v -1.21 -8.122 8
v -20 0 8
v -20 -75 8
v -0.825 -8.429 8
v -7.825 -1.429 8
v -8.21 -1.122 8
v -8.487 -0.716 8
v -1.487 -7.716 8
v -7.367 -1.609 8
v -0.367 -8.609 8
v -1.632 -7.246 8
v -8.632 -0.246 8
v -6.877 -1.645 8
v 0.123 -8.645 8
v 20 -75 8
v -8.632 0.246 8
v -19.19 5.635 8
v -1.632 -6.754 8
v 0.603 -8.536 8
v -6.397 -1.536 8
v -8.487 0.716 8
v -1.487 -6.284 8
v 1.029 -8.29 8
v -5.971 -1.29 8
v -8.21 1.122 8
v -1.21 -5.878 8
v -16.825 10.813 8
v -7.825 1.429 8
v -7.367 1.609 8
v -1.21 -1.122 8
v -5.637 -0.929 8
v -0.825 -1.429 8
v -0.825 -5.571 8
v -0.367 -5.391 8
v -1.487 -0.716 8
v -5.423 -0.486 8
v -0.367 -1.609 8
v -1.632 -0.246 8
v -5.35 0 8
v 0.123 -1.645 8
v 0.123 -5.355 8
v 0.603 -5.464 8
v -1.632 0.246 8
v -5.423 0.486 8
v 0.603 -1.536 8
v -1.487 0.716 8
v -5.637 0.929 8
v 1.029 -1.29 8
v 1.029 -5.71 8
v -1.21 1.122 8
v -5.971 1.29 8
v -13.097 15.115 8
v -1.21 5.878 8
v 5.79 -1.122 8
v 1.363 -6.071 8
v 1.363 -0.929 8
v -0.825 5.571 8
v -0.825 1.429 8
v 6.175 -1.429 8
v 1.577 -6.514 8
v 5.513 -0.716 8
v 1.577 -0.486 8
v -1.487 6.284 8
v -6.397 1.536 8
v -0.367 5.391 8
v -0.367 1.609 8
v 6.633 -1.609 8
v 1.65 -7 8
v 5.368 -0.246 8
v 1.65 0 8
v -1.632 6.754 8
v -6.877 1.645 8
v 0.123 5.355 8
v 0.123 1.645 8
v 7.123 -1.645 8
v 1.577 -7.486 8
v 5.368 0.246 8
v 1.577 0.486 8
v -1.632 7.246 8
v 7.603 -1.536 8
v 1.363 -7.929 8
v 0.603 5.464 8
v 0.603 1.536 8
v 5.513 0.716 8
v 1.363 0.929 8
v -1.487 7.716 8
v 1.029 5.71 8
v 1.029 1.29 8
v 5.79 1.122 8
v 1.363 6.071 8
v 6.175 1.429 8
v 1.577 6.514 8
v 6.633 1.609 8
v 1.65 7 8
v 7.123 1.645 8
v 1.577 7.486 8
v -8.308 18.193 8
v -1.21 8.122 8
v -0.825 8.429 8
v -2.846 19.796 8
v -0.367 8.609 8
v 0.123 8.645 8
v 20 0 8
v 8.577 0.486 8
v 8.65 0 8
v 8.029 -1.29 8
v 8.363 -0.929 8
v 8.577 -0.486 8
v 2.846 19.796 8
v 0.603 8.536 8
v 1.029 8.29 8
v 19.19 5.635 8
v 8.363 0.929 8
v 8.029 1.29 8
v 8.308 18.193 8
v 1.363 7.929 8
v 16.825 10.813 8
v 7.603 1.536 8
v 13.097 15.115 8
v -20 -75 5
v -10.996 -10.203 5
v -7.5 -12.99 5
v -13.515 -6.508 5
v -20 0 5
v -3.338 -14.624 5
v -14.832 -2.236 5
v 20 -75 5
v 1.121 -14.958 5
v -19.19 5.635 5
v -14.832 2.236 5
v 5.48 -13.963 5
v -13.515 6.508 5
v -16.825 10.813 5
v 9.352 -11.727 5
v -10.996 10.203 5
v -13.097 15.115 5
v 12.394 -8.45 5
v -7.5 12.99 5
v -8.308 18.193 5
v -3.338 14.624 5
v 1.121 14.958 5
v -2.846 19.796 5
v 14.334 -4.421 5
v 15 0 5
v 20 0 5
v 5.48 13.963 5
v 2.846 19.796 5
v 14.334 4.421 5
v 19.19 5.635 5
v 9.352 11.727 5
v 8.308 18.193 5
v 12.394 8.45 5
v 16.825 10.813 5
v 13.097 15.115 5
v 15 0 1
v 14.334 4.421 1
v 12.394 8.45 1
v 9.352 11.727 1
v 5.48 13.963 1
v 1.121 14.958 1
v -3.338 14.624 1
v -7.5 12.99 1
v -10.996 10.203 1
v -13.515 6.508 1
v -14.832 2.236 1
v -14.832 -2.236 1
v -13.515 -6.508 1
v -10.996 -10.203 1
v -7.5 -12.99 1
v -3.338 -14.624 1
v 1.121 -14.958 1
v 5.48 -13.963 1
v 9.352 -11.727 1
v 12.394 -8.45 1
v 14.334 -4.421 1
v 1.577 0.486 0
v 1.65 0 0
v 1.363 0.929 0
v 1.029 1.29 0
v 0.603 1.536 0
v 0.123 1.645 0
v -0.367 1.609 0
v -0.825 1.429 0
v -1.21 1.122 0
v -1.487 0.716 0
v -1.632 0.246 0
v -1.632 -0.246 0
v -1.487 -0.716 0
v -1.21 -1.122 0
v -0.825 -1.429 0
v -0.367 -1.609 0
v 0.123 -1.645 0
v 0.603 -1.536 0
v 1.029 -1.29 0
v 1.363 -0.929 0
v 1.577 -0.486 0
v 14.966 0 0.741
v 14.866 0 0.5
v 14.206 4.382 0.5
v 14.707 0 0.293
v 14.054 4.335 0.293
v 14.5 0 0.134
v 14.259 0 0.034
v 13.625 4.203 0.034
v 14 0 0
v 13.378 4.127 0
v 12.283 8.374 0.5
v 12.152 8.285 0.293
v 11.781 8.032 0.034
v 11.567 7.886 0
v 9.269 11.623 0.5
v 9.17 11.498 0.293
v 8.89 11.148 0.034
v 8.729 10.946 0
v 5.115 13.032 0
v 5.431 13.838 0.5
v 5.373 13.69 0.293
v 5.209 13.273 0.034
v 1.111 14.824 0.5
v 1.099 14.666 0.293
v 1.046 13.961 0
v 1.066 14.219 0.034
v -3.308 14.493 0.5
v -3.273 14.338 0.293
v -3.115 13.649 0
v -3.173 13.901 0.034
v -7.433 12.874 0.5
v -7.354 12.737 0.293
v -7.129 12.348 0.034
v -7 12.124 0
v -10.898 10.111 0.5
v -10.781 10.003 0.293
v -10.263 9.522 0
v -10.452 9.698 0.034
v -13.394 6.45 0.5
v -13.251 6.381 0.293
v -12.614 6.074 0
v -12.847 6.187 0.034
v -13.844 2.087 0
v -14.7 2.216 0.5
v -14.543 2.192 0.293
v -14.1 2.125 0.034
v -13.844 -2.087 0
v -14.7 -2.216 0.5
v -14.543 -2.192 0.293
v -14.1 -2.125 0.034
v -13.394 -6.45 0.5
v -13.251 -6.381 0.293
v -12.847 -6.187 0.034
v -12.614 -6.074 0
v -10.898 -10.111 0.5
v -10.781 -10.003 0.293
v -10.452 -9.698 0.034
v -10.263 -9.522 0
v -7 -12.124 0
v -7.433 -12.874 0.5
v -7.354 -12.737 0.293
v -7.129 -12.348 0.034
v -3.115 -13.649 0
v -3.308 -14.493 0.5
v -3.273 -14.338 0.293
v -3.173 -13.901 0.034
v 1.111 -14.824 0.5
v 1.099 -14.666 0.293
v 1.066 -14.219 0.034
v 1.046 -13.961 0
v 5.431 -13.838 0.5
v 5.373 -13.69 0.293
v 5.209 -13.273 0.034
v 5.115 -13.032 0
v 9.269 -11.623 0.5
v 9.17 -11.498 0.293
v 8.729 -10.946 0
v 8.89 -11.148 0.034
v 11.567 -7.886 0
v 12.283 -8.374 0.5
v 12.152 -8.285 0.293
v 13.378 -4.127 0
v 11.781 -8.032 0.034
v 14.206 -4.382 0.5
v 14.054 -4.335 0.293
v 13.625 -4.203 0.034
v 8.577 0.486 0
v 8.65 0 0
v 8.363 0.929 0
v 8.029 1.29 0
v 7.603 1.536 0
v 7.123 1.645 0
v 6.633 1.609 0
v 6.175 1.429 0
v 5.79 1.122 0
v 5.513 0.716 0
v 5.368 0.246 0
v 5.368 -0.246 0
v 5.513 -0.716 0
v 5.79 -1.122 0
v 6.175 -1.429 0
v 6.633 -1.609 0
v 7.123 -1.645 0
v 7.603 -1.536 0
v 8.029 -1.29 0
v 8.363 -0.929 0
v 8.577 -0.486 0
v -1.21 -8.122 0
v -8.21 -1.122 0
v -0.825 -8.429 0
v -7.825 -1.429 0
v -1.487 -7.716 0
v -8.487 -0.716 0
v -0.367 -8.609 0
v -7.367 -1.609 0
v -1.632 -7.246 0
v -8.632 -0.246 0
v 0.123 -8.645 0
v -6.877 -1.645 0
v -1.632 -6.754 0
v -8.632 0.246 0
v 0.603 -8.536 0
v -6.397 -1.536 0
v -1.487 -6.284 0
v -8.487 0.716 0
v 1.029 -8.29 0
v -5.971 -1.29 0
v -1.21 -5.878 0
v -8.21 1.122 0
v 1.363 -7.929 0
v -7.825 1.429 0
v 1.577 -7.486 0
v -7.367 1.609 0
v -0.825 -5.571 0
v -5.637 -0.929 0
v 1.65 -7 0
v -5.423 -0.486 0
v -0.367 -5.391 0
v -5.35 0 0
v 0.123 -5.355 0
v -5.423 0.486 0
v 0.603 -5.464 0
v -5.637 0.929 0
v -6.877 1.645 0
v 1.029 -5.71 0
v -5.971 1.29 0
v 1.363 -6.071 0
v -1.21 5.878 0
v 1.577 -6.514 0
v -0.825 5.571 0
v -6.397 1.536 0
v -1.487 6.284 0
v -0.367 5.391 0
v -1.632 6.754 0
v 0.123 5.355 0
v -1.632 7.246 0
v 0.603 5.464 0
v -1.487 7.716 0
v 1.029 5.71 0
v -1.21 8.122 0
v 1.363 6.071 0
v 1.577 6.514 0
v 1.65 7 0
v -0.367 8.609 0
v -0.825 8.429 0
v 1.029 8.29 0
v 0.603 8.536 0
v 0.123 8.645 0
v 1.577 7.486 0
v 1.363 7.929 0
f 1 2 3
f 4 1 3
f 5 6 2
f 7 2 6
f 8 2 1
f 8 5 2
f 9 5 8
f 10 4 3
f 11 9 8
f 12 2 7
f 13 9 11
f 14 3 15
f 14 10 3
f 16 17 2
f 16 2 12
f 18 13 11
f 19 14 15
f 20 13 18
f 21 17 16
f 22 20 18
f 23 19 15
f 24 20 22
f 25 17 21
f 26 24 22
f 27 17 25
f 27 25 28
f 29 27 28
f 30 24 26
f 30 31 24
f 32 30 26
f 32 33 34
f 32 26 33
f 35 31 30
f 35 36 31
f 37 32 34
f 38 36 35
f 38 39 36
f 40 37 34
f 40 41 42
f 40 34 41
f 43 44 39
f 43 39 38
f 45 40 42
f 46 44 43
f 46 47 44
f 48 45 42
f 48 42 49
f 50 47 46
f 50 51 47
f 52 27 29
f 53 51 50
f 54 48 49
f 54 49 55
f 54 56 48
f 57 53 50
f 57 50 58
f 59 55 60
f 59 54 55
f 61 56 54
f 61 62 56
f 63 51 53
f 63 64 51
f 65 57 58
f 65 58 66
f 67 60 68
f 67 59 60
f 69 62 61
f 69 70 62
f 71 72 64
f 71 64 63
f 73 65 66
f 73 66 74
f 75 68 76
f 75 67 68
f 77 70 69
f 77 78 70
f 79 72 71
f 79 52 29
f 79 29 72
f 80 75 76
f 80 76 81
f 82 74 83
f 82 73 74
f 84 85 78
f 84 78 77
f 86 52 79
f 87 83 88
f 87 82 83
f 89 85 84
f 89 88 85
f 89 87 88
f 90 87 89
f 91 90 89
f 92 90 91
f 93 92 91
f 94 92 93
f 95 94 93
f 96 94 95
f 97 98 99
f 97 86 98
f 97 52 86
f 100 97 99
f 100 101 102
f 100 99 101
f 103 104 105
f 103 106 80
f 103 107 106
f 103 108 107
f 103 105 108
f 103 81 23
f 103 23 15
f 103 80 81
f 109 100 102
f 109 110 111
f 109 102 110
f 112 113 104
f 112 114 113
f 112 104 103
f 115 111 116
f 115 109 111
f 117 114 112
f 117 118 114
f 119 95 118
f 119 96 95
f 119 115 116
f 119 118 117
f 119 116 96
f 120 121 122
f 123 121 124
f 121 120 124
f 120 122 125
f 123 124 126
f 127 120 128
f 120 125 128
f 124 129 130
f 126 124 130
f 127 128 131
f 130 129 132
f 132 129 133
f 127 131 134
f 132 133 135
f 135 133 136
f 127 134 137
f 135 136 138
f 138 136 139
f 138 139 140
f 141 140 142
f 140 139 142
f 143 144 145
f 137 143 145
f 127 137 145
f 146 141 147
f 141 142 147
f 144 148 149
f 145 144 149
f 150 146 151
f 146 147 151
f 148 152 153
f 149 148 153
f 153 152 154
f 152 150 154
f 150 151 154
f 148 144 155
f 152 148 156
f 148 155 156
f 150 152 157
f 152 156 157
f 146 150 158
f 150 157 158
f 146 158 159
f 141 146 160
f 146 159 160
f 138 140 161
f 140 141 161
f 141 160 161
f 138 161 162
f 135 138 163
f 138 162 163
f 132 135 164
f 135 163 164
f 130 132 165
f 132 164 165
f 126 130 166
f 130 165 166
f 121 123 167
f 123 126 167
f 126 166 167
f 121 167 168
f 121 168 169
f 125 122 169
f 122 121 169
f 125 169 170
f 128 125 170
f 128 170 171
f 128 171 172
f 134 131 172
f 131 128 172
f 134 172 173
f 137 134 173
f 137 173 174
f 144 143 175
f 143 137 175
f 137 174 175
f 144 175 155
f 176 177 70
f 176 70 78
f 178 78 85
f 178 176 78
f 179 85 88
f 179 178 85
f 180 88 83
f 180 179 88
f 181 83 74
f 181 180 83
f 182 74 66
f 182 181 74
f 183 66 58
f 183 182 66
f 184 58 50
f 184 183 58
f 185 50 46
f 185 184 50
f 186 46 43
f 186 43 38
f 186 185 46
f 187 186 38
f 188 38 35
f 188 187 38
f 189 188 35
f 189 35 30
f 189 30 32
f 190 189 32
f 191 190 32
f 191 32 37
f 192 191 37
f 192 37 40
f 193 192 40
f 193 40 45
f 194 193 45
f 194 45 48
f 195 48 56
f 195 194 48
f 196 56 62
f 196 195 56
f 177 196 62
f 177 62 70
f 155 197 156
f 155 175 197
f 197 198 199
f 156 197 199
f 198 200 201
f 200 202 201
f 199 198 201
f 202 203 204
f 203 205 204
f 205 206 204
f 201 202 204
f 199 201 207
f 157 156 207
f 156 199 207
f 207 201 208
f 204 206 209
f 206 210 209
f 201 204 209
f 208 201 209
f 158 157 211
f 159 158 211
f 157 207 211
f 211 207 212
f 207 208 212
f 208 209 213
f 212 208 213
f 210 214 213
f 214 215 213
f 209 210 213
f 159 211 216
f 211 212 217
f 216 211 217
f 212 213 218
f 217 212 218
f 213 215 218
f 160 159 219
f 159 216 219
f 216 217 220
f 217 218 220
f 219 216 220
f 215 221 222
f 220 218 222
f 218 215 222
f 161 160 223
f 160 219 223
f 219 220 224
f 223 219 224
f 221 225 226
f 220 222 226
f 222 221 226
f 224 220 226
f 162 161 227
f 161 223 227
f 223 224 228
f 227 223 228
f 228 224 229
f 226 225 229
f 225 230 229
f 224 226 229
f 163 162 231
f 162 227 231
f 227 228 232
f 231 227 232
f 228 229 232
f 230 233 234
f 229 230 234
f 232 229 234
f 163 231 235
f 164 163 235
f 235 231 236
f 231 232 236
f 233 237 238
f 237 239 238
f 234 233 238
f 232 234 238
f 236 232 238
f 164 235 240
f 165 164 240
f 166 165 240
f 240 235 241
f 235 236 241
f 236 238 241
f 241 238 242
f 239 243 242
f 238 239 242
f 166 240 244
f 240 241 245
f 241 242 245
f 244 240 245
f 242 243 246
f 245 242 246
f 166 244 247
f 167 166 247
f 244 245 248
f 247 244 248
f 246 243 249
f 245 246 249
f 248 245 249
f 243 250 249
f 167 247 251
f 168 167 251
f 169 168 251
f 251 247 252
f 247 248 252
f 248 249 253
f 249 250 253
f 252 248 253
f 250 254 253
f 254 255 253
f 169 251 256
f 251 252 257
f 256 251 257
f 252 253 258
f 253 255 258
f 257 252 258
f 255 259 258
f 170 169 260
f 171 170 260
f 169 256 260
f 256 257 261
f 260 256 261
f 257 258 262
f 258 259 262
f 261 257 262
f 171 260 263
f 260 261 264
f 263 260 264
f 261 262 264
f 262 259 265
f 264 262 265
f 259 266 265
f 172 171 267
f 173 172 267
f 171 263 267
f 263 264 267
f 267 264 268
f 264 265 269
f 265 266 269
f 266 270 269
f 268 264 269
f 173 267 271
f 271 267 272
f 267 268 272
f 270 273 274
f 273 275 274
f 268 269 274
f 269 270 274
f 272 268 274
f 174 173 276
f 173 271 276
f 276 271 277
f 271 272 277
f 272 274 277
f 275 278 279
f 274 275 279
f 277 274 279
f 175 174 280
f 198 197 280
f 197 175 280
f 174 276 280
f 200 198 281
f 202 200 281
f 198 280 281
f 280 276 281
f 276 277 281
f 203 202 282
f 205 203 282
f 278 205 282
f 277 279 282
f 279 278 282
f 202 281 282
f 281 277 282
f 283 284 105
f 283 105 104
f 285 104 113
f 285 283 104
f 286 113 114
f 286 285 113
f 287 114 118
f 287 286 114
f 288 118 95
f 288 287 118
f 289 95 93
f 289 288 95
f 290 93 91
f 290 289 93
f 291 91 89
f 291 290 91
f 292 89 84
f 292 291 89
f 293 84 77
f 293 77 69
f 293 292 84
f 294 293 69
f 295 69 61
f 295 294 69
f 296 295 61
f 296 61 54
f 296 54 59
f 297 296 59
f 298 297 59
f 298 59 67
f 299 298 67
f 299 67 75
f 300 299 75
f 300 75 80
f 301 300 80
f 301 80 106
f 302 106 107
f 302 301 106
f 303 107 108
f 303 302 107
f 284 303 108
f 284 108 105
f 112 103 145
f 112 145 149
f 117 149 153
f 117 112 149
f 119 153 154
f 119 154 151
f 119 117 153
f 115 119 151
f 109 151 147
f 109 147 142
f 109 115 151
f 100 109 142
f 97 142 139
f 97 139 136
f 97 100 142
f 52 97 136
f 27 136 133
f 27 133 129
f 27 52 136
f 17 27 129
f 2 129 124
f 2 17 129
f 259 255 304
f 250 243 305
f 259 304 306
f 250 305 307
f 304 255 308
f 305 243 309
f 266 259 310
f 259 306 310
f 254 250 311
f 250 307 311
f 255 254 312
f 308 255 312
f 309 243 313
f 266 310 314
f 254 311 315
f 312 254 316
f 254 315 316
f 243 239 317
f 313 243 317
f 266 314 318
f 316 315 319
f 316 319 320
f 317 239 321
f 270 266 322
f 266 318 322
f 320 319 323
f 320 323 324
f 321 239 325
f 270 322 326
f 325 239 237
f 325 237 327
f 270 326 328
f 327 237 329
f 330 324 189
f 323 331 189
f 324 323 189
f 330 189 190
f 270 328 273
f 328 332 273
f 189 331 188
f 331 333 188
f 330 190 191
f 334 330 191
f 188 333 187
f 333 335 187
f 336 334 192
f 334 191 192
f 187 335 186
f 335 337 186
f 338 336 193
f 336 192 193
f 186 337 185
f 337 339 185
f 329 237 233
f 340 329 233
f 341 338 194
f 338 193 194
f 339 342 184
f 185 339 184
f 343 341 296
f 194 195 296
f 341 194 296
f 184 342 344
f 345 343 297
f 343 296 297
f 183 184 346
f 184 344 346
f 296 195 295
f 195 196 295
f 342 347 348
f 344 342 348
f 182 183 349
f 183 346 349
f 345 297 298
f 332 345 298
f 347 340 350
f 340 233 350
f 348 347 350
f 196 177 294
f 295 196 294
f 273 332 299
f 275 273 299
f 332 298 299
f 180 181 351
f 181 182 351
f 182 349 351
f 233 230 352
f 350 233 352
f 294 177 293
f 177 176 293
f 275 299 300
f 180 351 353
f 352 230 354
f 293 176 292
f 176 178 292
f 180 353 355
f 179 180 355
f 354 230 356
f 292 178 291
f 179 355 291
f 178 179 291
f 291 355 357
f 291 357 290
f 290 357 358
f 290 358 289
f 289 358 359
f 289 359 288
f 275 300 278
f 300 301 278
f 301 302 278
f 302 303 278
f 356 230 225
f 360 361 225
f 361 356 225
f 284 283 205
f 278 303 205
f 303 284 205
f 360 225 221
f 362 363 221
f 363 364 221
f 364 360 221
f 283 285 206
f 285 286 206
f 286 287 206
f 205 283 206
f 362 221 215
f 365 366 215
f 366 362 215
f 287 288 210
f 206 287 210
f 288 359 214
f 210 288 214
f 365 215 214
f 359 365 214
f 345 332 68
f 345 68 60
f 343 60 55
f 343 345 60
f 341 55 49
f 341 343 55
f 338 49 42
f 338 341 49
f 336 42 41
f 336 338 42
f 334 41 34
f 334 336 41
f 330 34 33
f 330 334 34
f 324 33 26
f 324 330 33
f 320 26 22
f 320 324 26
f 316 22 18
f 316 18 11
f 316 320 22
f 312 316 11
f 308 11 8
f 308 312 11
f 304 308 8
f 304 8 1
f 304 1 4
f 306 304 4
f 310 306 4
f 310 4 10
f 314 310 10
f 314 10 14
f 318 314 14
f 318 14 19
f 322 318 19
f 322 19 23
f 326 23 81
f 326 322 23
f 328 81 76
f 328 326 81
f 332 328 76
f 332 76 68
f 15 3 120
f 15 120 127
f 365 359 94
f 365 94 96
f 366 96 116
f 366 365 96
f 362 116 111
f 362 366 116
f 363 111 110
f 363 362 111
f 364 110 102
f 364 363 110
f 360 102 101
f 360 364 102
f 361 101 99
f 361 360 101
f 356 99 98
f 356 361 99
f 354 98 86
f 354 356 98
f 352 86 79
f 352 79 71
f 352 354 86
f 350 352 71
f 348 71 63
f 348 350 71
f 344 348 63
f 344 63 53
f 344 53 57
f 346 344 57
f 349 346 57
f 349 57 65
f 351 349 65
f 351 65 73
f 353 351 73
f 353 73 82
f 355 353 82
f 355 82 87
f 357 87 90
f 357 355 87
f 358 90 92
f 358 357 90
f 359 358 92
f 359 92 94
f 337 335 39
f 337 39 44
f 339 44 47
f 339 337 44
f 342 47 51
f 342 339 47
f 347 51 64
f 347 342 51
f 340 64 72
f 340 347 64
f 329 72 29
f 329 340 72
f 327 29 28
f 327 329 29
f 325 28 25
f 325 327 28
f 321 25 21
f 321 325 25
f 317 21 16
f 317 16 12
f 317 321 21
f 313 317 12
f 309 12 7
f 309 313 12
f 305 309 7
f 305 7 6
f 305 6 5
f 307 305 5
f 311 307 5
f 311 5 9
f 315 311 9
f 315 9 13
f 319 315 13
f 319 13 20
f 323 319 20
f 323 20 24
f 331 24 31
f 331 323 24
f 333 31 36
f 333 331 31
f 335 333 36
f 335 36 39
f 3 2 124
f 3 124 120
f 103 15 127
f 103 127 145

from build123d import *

# Parameters (mm, degrees)
SKETCH_1_R      = 15
SKETCH_1_R_2    = 1.65
EXTRUDE_1_DEPTH = 8
FILLET_1_R      = 1
EXTRUDE_2_DEPTH = 3


with BuildPart() as part:
    # 草图1 → 凸台-拉伸1 (new body)
    with BuildSketch(Plane.XY):
        Circle(SKETCH_1_R)
        Circle(SKETCH_1_R_2, mode=Mode.SUBTRACT)
        with Locations((0, 7)):
            Circle(SKETCH_1_R_2, mode=Mode.SUBTRACT)
        with Locations((7, 0)):
            Circle(SKETCH_1_R_2, mode=Mode.SUBTRACT)
        with Locations((0, -7)):
            Circle(SKETCH_1_R_2, mode=Mode.SUBTRACT)
        with Locations((-7, 0)):
            Circle(SKETCH_1_R_2, mode=Mode.SUBTRACT)
    extrude(amount=EXTRUDE_1_DEPTH)

    # 圆角1
    fillet_1_edges = [part.edges().sort_by_distance(p)[0] for p in [
        (-15, 0, 0),
    ]]
    fillet(fillet_1_edges, radius=FILLET_1_R)

    # 草图2 → 凸台-拉伸2 (add)
    with BuildSketch(Plane.XY.offset(8)):
        with BuildLine():
            ThreePointArc((-15, 0), (0, 15), (15, 0))
            Line((15, 0), (20, 0))
            ThreePointArc((20, 0), (0, 20), (-20, 0))
            Line((-20, 0), (-15, 0))
        make_face()
        with BuildLine():
            Line((20, 0), (15, 0))
            ThreePointArc((15, 0), (0, -15), (-15, 0))
            Line((-15, 0), (-20, 0))
            ThreePointArc((-20, 0), (0, -20), (20, 0))
        make_face()
        with BuildLine():
            Line((20, -75), (20, 0))
            ThreePointArc((20, 0), (0, -20), (-20, 0))
            Line((-20, 0), (-20, -75))
            Line((-20, -75), (20, -75))
        make_face()
    extrude(amount=-EXTRUDE_2_DEPTH)


solid = part.part
